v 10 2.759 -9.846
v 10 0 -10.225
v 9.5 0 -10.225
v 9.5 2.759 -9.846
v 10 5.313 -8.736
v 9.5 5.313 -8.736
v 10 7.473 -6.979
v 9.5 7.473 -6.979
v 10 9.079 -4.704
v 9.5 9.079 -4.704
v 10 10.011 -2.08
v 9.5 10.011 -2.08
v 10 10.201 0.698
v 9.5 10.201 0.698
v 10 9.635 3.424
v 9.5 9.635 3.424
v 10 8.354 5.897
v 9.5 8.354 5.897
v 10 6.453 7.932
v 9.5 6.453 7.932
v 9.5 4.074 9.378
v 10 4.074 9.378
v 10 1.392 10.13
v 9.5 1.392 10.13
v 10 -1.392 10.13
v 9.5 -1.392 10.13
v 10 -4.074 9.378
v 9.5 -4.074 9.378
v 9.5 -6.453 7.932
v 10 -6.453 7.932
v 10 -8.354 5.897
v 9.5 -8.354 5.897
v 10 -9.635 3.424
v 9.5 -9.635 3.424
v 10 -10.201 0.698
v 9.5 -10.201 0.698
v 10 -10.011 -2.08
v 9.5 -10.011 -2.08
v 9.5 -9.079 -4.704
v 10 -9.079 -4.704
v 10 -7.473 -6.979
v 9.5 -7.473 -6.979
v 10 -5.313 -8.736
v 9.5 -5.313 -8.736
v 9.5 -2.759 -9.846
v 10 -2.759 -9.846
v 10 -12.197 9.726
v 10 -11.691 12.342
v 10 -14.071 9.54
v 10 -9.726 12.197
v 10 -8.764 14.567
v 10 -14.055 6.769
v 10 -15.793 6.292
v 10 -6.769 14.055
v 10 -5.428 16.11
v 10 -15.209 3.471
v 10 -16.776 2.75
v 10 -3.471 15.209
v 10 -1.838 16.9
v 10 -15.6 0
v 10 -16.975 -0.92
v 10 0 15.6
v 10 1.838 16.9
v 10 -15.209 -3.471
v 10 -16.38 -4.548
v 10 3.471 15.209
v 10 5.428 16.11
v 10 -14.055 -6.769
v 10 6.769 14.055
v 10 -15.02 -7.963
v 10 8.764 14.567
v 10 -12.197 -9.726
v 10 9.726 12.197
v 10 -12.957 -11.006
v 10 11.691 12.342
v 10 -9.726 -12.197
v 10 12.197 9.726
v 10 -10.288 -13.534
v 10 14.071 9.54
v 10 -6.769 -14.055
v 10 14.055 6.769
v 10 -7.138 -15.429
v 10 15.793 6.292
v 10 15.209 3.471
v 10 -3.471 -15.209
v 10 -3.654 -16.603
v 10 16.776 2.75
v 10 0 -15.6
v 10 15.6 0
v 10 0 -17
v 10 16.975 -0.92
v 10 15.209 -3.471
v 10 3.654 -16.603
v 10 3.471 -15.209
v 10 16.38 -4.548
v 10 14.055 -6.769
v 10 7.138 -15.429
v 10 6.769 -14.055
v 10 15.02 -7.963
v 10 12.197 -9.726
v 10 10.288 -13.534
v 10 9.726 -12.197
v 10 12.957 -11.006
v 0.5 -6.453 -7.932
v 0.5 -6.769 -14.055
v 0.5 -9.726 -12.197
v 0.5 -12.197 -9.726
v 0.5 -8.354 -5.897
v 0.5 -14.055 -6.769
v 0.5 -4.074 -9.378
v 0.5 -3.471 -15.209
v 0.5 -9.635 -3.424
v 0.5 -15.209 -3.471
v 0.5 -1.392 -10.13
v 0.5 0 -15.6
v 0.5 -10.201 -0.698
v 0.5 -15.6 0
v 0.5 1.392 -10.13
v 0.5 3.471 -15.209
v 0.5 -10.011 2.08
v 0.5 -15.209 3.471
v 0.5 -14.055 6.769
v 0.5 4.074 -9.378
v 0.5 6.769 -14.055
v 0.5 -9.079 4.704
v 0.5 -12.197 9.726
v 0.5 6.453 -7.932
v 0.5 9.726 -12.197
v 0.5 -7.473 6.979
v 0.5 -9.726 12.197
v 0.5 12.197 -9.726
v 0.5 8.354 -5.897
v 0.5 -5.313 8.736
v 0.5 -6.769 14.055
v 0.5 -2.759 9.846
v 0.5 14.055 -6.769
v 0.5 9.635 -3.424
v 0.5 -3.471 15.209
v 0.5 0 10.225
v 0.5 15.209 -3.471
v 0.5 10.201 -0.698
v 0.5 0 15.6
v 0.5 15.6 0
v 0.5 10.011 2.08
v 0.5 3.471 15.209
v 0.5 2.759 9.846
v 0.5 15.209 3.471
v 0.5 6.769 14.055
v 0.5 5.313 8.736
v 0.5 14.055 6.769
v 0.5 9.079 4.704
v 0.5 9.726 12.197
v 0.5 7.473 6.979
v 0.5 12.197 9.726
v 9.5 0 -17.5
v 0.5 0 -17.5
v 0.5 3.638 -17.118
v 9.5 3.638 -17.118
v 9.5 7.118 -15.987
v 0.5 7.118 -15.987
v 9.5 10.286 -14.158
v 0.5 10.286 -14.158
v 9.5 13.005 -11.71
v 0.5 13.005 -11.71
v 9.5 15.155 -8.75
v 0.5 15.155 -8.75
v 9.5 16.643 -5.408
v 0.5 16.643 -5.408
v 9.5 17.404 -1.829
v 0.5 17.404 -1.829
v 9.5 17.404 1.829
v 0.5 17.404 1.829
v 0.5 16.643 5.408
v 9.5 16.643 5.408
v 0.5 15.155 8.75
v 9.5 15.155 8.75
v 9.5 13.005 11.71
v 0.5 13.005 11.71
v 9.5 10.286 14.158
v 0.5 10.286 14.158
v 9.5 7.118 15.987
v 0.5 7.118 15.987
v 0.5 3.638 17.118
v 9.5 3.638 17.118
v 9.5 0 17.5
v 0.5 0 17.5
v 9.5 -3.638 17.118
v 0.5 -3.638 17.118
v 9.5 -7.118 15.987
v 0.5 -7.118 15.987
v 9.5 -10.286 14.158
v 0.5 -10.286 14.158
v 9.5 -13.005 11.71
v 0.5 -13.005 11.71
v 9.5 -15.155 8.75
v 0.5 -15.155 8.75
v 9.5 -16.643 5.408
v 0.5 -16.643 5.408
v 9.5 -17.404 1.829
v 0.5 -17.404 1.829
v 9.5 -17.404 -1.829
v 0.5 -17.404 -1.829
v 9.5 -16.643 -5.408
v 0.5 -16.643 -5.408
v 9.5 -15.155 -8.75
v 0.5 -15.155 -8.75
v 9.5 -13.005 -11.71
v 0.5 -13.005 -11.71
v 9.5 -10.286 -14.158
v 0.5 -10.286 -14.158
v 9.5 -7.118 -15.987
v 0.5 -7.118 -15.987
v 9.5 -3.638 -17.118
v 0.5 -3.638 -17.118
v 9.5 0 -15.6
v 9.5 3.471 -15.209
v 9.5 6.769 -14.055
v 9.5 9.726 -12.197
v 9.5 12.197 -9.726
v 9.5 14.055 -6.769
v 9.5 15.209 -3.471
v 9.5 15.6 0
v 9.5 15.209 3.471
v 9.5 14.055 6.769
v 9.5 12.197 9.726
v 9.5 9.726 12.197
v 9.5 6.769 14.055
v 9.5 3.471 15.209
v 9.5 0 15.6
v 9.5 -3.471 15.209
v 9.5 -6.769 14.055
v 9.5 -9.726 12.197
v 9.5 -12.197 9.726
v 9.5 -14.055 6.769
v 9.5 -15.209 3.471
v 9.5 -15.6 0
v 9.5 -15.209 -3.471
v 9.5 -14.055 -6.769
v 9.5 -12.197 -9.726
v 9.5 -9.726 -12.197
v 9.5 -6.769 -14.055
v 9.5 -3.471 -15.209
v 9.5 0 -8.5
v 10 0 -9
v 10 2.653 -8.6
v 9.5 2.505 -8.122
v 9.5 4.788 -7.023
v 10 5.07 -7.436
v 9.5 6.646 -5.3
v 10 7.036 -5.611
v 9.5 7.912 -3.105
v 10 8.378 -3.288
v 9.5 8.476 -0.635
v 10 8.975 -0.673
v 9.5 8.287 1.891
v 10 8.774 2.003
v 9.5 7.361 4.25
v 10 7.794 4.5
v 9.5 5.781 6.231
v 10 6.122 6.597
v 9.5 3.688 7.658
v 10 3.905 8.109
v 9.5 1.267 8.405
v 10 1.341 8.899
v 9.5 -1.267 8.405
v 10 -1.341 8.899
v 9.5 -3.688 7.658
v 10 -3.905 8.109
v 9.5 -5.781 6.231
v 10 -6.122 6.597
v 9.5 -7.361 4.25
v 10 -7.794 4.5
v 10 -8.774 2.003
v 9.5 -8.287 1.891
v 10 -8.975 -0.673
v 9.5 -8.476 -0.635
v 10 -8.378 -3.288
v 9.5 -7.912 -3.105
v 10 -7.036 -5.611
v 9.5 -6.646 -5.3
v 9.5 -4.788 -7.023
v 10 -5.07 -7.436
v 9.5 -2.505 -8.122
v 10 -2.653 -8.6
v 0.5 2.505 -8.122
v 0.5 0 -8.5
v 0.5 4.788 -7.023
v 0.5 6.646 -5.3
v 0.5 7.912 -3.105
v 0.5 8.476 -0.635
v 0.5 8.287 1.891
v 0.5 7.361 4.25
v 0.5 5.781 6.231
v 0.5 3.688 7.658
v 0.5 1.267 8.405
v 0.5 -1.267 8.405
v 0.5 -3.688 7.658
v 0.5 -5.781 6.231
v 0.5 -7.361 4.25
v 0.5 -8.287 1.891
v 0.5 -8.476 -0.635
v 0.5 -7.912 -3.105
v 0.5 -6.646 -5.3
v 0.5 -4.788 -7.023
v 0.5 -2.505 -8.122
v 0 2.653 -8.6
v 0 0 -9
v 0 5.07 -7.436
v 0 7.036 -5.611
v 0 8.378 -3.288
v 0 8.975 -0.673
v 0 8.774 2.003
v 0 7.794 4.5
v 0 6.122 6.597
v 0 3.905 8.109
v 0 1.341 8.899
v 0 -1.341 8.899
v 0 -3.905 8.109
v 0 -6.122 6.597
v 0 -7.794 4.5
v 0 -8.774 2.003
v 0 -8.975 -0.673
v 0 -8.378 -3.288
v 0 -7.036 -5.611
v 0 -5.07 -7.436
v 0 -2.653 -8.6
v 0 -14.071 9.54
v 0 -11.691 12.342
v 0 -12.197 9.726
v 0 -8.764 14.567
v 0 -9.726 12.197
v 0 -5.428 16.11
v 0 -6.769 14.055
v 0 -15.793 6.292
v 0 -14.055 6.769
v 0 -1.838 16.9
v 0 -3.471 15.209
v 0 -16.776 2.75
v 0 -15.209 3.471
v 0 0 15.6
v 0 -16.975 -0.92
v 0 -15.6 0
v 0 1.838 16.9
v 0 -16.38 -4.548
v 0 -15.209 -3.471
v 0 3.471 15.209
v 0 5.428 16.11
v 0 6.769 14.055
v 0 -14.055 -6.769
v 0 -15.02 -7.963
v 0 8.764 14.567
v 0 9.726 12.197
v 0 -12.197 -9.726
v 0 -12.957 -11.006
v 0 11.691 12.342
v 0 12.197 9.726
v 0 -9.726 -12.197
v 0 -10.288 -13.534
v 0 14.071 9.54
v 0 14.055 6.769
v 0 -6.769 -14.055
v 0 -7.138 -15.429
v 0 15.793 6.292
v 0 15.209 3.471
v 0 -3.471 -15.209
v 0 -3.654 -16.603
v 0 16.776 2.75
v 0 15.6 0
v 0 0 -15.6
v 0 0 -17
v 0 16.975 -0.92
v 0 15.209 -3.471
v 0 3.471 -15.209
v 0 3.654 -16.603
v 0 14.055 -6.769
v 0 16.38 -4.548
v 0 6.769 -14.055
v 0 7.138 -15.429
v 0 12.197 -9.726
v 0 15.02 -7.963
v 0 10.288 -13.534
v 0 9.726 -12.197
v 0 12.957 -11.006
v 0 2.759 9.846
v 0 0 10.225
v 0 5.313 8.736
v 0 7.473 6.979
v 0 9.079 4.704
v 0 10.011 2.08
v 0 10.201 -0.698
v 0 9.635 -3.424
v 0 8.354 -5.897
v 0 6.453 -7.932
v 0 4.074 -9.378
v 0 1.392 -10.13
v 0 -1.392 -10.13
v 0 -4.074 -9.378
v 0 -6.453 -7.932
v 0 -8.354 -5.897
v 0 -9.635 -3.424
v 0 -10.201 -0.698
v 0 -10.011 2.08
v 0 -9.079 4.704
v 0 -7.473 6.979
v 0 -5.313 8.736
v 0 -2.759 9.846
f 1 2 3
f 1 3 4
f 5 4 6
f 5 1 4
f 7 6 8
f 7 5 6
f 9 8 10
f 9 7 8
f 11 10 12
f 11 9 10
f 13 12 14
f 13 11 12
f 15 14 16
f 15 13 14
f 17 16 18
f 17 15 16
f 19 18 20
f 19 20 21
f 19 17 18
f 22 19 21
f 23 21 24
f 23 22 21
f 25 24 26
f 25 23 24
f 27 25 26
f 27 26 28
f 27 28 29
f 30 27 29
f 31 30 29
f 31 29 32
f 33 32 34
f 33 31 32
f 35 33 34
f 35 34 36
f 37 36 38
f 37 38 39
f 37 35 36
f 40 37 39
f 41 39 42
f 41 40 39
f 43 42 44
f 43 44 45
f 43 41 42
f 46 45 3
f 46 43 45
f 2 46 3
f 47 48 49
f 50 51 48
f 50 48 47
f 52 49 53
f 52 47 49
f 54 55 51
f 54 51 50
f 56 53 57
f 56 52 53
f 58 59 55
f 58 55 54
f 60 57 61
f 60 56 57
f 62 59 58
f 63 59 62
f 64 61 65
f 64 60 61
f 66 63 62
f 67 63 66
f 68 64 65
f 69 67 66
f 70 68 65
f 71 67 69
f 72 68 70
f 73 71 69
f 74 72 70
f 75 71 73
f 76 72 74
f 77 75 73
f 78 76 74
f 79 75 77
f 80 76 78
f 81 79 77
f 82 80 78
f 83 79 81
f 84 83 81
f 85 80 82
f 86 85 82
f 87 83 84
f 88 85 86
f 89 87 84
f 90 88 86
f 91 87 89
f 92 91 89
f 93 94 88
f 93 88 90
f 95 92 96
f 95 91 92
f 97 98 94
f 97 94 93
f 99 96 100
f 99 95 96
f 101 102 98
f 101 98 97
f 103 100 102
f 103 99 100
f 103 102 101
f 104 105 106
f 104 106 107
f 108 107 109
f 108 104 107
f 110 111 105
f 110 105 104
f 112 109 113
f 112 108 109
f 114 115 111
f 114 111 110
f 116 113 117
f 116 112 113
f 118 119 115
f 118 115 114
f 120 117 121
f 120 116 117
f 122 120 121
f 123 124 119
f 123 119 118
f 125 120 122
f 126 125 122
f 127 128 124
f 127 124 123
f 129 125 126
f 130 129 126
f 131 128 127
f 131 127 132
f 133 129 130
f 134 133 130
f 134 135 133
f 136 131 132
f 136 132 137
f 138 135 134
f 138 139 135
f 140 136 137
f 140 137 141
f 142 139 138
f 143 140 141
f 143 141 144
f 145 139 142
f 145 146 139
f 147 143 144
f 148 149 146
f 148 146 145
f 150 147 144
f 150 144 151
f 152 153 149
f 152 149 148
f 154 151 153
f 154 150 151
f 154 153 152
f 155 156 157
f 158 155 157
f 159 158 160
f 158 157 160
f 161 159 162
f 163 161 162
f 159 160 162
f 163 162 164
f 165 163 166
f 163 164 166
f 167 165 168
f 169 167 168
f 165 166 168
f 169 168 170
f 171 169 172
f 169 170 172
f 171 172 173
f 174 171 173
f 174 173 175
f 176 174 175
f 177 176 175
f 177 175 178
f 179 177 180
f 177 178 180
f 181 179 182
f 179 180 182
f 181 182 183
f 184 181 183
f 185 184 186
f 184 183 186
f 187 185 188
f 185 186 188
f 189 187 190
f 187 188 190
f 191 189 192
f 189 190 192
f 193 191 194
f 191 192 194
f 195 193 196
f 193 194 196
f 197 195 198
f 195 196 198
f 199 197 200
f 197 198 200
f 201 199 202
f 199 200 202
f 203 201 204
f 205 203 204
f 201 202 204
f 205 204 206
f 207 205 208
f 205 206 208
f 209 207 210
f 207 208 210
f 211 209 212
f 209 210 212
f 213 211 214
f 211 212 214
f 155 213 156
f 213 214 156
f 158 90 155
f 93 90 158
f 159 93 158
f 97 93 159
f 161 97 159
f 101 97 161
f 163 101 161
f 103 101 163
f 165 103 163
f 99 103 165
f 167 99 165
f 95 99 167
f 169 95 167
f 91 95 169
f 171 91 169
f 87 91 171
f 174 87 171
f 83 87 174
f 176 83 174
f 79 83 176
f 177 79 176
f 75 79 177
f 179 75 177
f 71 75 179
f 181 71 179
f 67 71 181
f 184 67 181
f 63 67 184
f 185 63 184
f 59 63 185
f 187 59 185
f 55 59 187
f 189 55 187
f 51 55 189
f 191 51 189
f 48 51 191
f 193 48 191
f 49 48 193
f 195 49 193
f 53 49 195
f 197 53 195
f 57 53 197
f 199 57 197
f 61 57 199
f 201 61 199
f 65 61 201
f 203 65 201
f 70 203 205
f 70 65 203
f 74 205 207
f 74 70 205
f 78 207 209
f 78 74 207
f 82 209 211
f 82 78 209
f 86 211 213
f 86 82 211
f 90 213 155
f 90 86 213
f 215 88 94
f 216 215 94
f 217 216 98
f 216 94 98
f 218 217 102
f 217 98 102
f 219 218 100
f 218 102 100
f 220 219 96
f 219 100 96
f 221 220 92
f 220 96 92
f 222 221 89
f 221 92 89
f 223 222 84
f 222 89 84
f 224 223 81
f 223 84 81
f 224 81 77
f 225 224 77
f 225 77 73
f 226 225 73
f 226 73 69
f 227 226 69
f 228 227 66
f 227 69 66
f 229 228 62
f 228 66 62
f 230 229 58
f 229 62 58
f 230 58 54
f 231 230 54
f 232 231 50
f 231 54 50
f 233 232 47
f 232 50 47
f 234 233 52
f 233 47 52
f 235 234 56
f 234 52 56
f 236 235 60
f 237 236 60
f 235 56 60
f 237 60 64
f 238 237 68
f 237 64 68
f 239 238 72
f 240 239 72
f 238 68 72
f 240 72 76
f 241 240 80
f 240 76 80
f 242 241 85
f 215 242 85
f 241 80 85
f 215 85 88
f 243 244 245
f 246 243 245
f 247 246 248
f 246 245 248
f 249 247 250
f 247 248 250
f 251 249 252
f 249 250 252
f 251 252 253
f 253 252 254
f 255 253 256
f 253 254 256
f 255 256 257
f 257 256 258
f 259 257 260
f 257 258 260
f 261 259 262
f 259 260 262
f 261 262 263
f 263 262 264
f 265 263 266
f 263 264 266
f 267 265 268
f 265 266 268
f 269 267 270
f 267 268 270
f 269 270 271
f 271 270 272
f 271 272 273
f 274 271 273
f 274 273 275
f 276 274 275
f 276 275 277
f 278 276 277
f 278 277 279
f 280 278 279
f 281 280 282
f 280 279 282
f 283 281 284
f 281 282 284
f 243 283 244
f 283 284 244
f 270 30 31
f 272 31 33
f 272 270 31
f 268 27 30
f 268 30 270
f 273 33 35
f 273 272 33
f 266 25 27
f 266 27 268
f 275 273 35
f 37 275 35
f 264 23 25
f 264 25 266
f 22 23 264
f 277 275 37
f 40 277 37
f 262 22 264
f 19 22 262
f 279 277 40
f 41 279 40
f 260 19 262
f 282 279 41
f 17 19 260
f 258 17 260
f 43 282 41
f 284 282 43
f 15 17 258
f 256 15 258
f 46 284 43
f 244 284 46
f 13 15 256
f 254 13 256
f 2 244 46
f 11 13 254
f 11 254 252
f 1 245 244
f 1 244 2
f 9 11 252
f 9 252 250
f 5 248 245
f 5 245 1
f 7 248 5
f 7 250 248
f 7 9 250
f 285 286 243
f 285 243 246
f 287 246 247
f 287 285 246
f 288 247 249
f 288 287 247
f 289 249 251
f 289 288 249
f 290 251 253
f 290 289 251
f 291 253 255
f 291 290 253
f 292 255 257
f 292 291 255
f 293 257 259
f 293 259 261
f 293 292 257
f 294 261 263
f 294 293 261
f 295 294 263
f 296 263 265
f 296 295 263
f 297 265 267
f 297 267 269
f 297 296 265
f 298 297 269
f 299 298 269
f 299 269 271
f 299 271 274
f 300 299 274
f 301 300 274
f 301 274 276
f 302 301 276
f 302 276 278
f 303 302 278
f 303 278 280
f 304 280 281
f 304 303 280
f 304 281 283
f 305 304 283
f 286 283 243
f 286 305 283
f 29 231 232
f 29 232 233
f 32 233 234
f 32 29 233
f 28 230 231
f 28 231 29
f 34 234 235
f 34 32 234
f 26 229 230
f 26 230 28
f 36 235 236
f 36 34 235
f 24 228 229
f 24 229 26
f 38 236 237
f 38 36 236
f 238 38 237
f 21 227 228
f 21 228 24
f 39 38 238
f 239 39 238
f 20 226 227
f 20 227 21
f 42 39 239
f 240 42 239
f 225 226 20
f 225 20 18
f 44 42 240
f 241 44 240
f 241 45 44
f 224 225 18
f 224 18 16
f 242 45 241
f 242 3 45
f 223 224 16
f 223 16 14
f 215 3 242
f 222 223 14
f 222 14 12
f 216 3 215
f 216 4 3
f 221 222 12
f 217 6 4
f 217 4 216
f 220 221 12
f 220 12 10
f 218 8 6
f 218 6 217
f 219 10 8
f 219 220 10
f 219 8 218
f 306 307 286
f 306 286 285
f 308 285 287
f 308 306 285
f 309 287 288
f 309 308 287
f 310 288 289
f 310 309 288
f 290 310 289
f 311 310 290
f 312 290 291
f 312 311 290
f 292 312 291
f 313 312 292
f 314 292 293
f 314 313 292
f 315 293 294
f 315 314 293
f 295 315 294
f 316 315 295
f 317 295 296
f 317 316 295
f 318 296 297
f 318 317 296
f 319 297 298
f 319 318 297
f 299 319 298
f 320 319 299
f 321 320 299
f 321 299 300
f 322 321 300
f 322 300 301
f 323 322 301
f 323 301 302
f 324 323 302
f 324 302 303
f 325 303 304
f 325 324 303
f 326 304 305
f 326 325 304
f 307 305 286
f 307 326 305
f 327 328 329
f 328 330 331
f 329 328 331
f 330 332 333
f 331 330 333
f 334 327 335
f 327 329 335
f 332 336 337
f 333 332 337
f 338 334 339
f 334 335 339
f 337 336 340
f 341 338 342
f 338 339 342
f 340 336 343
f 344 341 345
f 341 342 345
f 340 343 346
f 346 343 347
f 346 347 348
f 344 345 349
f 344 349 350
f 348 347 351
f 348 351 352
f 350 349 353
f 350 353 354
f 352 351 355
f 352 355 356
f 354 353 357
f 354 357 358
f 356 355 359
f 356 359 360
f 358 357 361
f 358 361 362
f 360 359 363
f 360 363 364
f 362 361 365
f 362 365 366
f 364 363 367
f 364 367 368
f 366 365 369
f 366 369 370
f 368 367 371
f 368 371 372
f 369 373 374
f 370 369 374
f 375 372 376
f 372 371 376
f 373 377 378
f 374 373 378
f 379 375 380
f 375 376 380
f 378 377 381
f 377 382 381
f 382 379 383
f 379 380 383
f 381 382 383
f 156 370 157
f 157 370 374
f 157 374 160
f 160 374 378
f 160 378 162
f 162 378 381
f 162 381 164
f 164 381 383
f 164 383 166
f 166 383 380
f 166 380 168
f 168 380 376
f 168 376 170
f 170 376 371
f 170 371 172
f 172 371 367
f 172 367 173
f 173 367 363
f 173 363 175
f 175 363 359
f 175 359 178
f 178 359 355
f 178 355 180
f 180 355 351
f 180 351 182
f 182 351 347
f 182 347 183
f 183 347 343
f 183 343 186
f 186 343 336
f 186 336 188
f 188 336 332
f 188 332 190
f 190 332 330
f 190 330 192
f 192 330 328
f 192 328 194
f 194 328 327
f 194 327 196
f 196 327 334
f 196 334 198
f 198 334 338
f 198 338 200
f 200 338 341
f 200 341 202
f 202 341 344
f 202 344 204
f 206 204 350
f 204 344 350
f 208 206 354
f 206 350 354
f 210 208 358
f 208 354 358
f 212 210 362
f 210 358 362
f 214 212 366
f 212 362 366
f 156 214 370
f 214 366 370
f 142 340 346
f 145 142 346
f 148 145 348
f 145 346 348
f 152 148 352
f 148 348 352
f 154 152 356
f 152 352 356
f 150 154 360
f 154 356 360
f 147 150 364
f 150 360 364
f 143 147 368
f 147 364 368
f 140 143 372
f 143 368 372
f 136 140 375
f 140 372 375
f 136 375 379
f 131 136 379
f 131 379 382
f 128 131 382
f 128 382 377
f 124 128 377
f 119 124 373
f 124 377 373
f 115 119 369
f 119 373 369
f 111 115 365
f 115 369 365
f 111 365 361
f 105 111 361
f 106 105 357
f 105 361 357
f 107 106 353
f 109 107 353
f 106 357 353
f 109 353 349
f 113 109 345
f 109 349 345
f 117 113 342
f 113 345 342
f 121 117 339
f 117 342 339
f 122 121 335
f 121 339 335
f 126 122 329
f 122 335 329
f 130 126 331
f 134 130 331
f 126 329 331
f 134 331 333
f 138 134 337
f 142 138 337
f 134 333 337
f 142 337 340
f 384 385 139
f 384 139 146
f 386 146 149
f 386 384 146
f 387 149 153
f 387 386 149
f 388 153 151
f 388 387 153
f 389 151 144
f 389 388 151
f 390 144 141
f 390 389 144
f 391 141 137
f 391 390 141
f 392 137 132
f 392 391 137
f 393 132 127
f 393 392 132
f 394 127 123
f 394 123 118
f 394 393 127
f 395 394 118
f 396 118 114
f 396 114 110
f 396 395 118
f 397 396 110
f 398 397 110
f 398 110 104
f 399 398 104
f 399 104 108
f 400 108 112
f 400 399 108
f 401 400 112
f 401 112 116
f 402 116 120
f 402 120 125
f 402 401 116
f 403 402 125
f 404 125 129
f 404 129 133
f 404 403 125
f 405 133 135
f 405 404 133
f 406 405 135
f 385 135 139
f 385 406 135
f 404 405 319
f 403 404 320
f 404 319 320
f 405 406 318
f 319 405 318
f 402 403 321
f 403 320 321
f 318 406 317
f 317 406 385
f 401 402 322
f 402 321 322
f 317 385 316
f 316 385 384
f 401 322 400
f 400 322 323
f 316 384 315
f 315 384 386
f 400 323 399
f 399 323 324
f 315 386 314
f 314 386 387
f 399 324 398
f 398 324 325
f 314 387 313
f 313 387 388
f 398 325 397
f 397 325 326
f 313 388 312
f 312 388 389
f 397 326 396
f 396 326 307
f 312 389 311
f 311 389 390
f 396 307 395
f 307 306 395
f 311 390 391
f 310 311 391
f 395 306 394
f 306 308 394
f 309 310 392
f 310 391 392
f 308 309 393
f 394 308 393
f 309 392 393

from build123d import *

# Parameters (mm, degrees)
SKETCH1_R           = 17.5
SKETCH1_R_2         = 8.5
BOSS_EXTRUDE1_DEPTH = 10
CHAMFER1_SIZE       = 0.5
SKETCH2_R           = 15.6
SKETCH2_R_2         = 10.225
CUT_EXTRUDE1_DEPTH  = 0.5
SKETCH3_R           = 15.6
SKETCH3_R_2         = 10.225
CUT_EXTRUDE2_DEPTH  = 0.5


with BuildPart() as part:
    # Sketch1 → Boss-Extrude1 (new body)
    with BuildSketch(Plane(origin=(0, 0, 0), x_dir=(0, 0, -1), z_dir=(1, 0, 0))):
        Circle(SKETCH1_R)
        Circle(SKETCH1_R_2, mode=Mode.SUBTRACT)
    extrude(amount=BOSS_EXTRUDE1_DEPTH)

    # Chamfer1
    chamfer1_edges = [part.edges().sort_by_distance(p)[0] for p in [
        (0, 0, 17.5),
        (10, 0, 17.5),
        (0, 0, 8.5),
        (10, 0, 8.5),
    ]]
    chamfer(chamfer1_edges, length=CHAMFER1_SIZE)

    # Sketch2 → Cut-Extrude1 (cut)
    with BuildSketch(Plane(origin=(10, 0, 0), x_dir=(0, 0, -1), z_dir=(1, 0, 0))):
        Circle(SKETCH2_R)
        Circle(SKETCH2_R_2, mode=Mode.SUBTRACT)
    extrude(amount=-CUT_EXTRUDE1_DEPTH, mode=Mode.SUBTRACT)

    # Sketch3 → Cut-Extrude2 (cut)
    with BuildSketch(Plane.ZY):
        Circle(SKETCH3_R)
        Circle(SKETCH3_R_2, mode=Mode.SUBTRACT)
    extrude(amount=-CUT_EXTRUDE2_DEPTH, mode=Mode.SUBTRACT)


solid = part.part
